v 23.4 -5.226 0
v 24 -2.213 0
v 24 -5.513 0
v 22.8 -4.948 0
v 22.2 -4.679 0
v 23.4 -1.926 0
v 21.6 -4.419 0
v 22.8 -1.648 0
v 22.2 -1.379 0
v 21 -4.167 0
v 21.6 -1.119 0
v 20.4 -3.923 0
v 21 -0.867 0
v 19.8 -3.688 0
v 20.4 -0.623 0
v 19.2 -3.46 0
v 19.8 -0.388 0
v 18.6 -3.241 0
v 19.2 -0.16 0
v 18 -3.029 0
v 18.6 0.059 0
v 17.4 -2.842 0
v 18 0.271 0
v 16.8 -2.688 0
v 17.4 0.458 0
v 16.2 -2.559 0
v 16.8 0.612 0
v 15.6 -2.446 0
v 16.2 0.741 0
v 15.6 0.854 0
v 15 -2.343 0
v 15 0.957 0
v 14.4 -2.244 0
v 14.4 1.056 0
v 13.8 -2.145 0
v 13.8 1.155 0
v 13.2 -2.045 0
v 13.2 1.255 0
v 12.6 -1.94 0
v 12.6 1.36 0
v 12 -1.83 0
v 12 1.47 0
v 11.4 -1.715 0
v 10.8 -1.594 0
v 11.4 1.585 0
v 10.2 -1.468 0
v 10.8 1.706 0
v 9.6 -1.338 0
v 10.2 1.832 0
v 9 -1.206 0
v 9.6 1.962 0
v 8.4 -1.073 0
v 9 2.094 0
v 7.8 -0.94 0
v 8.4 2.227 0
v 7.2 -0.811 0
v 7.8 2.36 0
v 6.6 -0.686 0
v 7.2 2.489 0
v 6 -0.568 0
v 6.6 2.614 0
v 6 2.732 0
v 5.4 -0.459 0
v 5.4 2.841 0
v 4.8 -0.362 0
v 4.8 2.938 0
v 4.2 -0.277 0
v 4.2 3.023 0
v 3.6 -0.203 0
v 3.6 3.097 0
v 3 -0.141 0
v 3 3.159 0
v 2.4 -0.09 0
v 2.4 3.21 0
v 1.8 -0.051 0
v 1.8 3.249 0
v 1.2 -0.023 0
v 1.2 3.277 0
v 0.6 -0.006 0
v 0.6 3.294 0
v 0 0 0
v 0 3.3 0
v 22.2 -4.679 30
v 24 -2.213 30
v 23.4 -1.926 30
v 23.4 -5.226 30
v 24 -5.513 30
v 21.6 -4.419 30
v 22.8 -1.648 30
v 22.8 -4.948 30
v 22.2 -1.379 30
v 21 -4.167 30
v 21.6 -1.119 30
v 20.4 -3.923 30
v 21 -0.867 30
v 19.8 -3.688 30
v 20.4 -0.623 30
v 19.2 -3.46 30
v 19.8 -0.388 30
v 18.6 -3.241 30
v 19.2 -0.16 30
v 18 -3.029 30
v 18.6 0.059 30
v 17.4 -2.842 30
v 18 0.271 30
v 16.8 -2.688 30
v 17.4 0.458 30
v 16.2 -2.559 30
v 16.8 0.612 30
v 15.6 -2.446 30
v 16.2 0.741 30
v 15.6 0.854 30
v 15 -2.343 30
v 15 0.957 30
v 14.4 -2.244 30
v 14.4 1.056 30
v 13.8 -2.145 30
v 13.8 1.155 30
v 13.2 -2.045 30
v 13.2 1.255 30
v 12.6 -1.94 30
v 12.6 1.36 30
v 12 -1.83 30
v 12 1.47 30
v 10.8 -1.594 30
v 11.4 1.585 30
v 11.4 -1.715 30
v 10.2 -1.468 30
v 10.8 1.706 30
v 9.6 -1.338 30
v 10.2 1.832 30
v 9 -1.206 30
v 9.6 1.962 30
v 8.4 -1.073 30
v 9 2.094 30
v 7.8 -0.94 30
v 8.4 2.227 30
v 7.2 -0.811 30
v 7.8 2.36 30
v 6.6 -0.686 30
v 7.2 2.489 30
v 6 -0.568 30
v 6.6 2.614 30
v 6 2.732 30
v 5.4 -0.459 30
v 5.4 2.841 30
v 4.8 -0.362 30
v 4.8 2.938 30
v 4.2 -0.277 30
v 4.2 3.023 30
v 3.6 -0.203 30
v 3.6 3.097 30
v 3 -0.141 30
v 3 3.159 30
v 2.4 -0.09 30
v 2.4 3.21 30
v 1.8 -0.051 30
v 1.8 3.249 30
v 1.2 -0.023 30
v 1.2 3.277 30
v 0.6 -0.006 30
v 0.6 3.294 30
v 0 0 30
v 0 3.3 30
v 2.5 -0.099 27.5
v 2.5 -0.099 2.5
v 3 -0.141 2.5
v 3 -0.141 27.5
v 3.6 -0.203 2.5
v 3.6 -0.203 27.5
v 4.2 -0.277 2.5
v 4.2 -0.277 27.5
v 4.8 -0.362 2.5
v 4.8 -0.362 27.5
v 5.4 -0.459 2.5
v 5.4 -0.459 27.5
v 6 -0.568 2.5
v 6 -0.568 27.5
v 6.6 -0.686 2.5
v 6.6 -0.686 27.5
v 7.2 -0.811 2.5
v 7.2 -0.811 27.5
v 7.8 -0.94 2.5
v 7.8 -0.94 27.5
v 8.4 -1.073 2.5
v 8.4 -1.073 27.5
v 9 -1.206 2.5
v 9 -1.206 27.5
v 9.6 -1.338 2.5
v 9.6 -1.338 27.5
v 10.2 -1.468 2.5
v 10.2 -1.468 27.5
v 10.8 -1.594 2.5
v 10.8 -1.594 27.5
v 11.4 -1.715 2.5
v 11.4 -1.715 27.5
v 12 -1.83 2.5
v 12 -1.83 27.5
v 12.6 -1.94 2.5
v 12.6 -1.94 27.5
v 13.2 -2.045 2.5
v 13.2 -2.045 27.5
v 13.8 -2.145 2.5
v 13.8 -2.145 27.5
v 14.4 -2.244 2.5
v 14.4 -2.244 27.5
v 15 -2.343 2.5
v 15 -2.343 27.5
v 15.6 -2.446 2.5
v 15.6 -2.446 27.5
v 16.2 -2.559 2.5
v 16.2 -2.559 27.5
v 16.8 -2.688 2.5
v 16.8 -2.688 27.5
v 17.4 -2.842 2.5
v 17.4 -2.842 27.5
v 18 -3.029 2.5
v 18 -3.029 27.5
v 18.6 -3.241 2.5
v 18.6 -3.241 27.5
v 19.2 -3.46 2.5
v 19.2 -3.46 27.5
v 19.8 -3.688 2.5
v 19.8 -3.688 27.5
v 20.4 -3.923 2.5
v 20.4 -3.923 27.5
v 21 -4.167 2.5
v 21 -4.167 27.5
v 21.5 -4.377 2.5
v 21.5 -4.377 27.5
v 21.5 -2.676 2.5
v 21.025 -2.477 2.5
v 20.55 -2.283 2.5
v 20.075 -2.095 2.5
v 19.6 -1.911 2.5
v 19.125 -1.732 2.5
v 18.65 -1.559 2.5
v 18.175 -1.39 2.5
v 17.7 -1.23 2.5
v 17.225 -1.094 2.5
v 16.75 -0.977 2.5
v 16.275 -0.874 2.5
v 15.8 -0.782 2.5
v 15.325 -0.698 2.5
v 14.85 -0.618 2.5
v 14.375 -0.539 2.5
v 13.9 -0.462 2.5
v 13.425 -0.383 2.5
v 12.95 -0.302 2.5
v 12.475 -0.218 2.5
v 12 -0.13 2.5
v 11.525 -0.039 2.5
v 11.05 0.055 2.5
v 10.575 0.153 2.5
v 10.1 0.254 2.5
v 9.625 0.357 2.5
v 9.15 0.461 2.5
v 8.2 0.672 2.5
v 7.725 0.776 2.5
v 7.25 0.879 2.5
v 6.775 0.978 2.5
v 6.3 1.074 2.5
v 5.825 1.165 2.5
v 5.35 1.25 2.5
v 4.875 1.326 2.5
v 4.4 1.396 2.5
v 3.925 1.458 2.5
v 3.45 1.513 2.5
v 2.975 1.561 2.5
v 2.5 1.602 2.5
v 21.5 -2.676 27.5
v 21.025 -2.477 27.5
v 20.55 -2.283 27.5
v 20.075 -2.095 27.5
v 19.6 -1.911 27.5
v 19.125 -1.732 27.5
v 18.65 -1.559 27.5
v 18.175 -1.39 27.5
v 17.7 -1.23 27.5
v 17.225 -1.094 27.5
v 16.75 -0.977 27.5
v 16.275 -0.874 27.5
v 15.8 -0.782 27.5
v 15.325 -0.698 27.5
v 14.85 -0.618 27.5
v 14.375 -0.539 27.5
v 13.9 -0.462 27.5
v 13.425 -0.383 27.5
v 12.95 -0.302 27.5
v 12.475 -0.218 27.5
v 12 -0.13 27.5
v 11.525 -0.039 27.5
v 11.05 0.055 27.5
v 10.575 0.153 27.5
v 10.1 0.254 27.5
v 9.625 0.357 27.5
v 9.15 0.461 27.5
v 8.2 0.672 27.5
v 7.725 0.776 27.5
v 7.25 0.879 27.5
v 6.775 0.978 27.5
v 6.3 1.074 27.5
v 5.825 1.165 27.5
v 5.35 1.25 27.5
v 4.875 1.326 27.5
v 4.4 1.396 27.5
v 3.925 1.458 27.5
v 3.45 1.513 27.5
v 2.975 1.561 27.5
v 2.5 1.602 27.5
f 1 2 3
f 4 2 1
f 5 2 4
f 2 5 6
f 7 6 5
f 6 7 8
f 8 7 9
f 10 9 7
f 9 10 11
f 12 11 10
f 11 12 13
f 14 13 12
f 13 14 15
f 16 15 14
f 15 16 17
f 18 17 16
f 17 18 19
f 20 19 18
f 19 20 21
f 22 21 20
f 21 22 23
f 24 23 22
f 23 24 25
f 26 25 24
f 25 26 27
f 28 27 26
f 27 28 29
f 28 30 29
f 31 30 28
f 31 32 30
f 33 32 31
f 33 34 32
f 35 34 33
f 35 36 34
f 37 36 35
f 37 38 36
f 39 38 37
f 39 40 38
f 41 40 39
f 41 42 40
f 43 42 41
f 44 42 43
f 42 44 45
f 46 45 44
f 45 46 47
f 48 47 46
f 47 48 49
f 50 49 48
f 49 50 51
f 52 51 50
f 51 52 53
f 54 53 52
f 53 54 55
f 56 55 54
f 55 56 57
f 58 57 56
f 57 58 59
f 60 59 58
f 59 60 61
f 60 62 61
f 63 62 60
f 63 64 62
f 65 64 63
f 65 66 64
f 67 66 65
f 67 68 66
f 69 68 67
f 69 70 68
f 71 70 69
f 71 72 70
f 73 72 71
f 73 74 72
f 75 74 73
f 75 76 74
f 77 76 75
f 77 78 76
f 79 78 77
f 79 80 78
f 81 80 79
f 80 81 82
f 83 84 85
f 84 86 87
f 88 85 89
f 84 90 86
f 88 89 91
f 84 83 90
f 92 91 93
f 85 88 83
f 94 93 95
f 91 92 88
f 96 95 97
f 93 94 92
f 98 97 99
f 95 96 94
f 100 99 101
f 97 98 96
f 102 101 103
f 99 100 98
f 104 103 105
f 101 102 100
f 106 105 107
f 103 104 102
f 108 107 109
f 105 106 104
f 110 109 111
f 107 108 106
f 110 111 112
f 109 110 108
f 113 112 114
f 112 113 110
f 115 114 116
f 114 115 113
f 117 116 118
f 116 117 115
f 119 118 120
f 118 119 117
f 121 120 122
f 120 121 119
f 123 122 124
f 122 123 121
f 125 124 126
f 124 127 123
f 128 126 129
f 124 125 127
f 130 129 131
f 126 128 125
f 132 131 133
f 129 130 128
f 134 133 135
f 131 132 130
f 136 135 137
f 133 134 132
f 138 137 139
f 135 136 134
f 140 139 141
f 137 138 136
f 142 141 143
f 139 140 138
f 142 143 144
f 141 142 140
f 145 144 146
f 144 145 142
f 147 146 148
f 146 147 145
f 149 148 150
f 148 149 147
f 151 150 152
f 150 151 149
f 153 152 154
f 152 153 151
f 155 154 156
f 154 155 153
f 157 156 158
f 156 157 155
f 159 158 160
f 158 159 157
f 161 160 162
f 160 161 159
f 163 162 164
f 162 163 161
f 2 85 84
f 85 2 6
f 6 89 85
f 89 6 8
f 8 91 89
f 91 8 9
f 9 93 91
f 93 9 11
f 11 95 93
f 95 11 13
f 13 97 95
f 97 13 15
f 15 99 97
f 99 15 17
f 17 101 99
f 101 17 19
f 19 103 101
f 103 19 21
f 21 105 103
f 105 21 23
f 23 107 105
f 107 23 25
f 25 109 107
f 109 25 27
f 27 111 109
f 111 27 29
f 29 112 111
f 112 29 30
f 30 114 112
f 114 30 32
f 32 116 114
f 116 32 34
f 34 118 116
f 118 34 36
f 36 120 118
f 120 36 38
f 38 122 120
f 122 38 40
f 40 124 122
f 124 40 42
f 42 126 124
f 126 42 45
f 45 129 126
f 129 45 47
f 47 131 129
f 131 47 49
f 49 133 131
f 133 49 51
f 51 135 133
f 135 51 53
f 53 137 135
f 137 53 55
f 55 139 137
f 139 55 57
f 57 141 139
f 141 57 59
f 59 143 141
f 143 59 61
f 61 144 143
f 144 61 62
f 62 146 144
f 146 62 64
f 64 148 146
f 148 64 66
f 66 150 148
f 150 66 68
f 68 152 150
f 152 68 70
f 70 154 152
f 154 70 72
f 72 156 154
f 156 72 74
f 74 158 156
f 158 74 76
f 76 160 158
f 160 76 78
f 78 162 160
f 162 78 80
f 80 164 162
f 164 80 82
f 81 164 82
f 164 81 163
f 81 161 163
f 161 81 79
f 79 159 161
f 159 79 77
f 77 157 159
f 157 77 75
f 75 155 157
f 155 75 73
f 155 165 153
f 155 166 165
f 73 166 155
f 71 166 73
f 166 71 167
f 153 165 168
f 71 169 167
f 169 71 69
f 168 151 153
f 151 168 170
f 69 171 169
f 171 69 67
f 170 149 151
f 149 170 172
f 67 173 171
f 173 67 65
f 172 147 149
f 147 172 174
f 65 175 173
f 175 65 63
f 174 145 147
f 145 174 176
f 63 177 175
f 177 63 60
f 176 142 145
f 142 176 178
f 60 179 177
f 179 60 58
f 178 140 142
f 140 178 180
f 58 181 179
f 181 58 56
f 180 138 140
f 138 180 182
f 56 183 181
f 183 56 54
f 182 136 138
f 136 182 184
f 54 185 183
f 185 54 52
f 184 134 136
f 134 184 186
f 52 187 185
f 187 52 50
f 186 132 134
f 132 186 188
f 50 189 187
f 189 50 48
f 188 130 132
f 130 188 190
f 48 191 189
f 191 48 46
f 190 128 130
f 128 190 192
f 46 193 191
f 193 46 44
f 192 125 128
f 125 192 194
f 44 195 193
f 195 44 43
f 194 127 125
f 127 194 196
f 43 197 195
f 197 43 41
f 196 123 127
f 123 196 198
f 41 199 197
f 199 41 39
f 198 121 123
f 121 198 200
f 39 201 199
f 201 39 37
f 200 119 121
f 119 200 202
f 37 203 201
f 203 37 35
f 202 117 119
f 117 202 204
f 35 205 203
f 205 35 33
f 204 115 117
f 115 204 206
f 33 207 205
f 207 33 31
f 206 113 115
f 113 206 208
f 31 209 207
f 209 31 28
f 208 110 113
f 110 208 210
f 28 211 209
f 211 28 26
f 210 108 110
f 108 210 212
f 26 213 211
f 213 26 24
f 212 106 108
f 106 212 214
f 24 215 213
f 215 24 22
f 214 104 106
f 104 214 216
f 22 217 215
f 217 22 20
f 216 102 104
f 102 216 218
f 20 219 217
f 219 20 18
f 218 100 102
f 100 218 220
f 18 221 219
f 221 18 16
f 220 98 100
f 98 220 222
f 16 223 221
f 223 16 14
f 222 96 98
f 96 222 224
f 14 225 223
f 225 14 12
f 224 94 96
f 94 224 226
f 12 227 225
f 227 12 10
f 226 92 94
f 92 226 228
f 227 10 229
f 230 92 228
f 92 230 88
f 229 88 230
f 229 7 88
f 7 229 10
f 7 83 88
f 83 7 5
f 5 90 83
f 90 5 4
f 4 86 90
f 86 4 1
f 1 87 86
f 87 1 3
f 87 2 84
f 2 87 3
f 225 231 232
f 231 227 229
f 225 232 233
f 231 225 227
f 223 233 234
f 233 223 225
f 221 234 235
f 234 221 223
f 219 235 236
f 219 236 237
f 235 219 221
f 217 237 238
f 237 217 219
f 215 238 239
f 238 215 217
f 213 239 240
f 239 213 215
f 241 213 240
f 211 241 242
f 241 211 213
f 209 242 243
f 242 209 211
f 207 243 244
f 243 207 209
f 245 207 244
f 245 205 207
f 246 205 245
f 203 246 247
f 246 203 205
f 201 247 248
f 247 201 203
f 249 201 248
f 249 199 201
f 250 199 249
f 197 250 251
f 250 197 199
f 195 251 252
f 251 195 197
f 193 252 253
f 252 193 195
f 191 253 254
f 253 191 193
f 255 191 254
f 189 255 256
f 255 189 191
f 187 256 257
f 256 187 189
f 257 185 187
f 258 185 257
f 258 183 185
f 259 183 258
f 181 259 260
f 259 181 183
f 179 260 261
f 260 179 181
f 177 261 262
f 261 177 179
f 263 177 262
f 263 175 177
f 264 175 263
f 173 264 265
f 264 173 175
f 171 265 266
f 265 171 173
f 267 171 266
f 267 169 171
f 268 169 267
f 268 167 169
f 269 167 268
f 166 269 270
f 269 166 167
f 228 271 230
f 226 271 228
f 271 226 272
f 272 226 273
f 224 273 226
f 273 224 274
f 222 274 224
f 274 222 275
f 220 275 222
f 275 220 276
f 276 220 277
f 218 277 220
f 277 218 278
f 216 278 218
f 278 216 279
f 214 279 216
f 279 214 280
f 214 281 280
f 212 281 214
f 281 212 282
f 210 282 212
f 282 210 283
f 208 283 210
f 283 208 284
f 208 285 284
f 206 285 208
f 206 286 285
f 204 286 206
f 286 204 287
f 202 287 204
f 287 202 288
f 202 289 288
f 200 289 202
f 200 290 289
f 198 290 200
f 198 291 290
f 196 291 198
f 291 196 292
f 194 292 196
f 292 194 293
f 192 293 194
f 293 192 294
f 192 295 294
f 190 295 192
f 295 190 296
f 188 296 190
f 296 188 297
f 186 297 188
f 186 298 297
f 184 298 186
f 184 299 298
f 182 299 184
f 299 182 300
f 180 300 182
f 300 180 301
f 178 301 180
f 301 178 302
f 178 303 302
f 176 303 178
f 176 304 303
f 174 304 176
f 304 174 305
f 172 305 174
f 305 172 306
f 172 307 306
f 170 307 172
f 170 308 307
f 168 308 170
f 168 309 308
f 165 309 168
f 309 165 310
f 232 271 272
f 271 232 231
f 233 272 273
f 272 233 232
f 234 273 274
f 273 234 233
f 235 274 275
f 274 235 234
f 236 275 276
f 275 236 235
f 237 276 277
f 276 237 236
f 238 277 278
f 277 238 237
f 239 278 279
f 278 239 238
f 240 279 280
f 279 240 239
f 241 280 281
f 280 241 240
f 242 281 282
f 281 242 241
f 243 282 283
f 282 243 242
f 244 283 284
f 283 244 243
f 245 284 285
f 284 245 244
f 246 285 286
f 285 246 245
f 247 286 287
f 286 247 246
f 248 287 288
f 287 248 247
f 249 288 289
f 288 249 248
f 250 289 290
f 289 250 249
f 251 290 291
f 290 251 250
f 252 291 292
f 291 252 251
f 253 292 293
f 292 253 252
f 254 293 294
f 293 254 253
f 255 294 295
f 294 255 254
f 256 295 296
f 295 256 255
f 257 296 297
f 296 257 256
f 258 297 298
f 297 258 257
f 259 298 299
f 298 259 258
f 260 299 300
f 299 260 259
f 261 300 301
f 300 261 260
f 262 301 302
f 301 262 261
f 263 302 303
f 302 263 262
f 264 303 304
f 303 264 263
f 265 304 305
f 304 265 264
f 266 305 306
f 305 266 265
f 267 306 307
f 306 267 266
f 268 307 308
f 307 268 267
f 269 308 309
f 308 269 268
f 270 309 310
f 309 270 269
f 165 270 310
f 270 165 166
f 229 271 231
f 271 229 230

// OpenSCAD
// ============================================================
// Wrist-conforming mount piece (independent of puck body)
// Sits on ONE side of the puck; print two, mirror for the other.
// The LRA window stays bare — this piece never covers it.
//
// Modeling axes (before you rotate for your own print orientation):
//   X = curve "run" from the puck-side edge (x=0) out to the
//       strap-side edge (x=mount_run)
//   Y = height/sag of the curve (this is the direction that
//       drops away from the puck as the piece follows the wrist)
//   Z = width along the wrist / strap direction (mount_length)
//
// Curve is a smooth blend of two circular arcs: tighter radius
// near the puck (r_inner), gentler radius near the strap edge
// (r_outer), blended over [blend_start, blend_end]. This is a
// single difference() between two well-conditioned (smooth,
// non-spiky) extruded solids -- not the multi-union pattern that
// broke CGAL on the cameo project, so no heightmap workaround
// should be needed here. Render-tested below.
// ============================================================

// ---------- PARAMETERS (mm) ----------------------------------
mount_run    = 24;   // curve profile length, puck-edge to strap-edge
mount_length = 30;   // width along the wrist (strap direction)

r_inner = 32;   // curvature radius near the puck edge (tighter)
r_outer = 55;   // curvature radius near the strap edge (gentler)
blend_start = 6;     // x where blend away from r_inner begins
blend_end   = 18;    // x where blend to r_outer completes

back_thickness = 1.6;   // solid backing thickness above the pocket floor (structural)
rim_width      = 2.5;   // solid rim border around the foam pocket (all sides)

foam_thickness = 2.0;   // target foam pad thickness (adjust once you've picked stock)
foam_proud     = 0.3;   // how far the foam should sit proud of the rim at rest
pocket_depth   = foam_thickness - foam_proud;  // recess cut UP from the rim plane for the foam

seg = 40;   // profile sample resolution
$fn = 60;

// ---------- CURVE MATH ----------------------------------------
function sag(x, r) = r - sqrt(max(r*r - x*x, 0));

function smoothstep(x, a, b) =
    let(t = min(max((x - a) / (b - a), 0), 1))
    t * t * (3 - 2 * t);

function sag_blend(x) =
    let(w = smoothstep(x, blend_start, blend_end))
    sag(x, r_inner) * (1 - w) + sag(x, r_outer) * w;

// skin-facing (bottom / rim) curve -- dips down (negative) as x grows
function z_bottom(x) = -sag_blend(x);
// pocket floor: recessed UP from the rim plane by pocket_depth
function z_floor(x) = z_bottom(x) + pocket_depth;
// outer back surface, above the floor by the structural backing
function shell_top_z(x) = z_floor(x) + back_thickness;

// ---------- 2D PROFILES -----------------------------------------
module shell_profile() {
    bottom_pts = [ for (i = [0:seg]) let(x = mount_run * i / seg) [x, z_bottom(x)] ];
    top_pts    = [ for (i = [seg:-1:0]) let(x = mount_run * i / seg) [x, shell_top_z(x)] ];
    polygon(concat(bottom_pts, top_pts));
}

// Cuts the pocket from the skin-facing (bottom) side up to the
// floor -- inset by rim_width in x so a solid rim survives all
// the way around. The -1 undercut guarantees the cut breaks
// cleanly through the bottom face rather than leaving a skin.
module pocket_profile() {
    x0 = rim_width;
    x1 = mount_run - rim_width;
    bottom_pts = [ for (i = [0:seg]) let(x = x0 + (x1 - x0) * i / seg) [x, z_bottom(x) - 1] ];
    top_pts    = [ for (i = [seg:-1:0]) let(x = x0 + (x1 - x0) * i / seg) [x, z_floor(x)] ];
    polygon(concat(bottom_pts, top_pts));
}

// ---------- 3D PIECE ---------------------------------------------
module mount_piece() {
    difference() {
        linear_extrude(height = mount_length)
            shell_profile();
        translate([0, 0, rim_width])
            linear_extrude(height = mount_length - 2 * rim_width)
                pocket_profile();
    }
}

mount_piece();

// For the mirrored (opposite-side) piece:
// mirror([1, 0, 0]) mount_piece();
